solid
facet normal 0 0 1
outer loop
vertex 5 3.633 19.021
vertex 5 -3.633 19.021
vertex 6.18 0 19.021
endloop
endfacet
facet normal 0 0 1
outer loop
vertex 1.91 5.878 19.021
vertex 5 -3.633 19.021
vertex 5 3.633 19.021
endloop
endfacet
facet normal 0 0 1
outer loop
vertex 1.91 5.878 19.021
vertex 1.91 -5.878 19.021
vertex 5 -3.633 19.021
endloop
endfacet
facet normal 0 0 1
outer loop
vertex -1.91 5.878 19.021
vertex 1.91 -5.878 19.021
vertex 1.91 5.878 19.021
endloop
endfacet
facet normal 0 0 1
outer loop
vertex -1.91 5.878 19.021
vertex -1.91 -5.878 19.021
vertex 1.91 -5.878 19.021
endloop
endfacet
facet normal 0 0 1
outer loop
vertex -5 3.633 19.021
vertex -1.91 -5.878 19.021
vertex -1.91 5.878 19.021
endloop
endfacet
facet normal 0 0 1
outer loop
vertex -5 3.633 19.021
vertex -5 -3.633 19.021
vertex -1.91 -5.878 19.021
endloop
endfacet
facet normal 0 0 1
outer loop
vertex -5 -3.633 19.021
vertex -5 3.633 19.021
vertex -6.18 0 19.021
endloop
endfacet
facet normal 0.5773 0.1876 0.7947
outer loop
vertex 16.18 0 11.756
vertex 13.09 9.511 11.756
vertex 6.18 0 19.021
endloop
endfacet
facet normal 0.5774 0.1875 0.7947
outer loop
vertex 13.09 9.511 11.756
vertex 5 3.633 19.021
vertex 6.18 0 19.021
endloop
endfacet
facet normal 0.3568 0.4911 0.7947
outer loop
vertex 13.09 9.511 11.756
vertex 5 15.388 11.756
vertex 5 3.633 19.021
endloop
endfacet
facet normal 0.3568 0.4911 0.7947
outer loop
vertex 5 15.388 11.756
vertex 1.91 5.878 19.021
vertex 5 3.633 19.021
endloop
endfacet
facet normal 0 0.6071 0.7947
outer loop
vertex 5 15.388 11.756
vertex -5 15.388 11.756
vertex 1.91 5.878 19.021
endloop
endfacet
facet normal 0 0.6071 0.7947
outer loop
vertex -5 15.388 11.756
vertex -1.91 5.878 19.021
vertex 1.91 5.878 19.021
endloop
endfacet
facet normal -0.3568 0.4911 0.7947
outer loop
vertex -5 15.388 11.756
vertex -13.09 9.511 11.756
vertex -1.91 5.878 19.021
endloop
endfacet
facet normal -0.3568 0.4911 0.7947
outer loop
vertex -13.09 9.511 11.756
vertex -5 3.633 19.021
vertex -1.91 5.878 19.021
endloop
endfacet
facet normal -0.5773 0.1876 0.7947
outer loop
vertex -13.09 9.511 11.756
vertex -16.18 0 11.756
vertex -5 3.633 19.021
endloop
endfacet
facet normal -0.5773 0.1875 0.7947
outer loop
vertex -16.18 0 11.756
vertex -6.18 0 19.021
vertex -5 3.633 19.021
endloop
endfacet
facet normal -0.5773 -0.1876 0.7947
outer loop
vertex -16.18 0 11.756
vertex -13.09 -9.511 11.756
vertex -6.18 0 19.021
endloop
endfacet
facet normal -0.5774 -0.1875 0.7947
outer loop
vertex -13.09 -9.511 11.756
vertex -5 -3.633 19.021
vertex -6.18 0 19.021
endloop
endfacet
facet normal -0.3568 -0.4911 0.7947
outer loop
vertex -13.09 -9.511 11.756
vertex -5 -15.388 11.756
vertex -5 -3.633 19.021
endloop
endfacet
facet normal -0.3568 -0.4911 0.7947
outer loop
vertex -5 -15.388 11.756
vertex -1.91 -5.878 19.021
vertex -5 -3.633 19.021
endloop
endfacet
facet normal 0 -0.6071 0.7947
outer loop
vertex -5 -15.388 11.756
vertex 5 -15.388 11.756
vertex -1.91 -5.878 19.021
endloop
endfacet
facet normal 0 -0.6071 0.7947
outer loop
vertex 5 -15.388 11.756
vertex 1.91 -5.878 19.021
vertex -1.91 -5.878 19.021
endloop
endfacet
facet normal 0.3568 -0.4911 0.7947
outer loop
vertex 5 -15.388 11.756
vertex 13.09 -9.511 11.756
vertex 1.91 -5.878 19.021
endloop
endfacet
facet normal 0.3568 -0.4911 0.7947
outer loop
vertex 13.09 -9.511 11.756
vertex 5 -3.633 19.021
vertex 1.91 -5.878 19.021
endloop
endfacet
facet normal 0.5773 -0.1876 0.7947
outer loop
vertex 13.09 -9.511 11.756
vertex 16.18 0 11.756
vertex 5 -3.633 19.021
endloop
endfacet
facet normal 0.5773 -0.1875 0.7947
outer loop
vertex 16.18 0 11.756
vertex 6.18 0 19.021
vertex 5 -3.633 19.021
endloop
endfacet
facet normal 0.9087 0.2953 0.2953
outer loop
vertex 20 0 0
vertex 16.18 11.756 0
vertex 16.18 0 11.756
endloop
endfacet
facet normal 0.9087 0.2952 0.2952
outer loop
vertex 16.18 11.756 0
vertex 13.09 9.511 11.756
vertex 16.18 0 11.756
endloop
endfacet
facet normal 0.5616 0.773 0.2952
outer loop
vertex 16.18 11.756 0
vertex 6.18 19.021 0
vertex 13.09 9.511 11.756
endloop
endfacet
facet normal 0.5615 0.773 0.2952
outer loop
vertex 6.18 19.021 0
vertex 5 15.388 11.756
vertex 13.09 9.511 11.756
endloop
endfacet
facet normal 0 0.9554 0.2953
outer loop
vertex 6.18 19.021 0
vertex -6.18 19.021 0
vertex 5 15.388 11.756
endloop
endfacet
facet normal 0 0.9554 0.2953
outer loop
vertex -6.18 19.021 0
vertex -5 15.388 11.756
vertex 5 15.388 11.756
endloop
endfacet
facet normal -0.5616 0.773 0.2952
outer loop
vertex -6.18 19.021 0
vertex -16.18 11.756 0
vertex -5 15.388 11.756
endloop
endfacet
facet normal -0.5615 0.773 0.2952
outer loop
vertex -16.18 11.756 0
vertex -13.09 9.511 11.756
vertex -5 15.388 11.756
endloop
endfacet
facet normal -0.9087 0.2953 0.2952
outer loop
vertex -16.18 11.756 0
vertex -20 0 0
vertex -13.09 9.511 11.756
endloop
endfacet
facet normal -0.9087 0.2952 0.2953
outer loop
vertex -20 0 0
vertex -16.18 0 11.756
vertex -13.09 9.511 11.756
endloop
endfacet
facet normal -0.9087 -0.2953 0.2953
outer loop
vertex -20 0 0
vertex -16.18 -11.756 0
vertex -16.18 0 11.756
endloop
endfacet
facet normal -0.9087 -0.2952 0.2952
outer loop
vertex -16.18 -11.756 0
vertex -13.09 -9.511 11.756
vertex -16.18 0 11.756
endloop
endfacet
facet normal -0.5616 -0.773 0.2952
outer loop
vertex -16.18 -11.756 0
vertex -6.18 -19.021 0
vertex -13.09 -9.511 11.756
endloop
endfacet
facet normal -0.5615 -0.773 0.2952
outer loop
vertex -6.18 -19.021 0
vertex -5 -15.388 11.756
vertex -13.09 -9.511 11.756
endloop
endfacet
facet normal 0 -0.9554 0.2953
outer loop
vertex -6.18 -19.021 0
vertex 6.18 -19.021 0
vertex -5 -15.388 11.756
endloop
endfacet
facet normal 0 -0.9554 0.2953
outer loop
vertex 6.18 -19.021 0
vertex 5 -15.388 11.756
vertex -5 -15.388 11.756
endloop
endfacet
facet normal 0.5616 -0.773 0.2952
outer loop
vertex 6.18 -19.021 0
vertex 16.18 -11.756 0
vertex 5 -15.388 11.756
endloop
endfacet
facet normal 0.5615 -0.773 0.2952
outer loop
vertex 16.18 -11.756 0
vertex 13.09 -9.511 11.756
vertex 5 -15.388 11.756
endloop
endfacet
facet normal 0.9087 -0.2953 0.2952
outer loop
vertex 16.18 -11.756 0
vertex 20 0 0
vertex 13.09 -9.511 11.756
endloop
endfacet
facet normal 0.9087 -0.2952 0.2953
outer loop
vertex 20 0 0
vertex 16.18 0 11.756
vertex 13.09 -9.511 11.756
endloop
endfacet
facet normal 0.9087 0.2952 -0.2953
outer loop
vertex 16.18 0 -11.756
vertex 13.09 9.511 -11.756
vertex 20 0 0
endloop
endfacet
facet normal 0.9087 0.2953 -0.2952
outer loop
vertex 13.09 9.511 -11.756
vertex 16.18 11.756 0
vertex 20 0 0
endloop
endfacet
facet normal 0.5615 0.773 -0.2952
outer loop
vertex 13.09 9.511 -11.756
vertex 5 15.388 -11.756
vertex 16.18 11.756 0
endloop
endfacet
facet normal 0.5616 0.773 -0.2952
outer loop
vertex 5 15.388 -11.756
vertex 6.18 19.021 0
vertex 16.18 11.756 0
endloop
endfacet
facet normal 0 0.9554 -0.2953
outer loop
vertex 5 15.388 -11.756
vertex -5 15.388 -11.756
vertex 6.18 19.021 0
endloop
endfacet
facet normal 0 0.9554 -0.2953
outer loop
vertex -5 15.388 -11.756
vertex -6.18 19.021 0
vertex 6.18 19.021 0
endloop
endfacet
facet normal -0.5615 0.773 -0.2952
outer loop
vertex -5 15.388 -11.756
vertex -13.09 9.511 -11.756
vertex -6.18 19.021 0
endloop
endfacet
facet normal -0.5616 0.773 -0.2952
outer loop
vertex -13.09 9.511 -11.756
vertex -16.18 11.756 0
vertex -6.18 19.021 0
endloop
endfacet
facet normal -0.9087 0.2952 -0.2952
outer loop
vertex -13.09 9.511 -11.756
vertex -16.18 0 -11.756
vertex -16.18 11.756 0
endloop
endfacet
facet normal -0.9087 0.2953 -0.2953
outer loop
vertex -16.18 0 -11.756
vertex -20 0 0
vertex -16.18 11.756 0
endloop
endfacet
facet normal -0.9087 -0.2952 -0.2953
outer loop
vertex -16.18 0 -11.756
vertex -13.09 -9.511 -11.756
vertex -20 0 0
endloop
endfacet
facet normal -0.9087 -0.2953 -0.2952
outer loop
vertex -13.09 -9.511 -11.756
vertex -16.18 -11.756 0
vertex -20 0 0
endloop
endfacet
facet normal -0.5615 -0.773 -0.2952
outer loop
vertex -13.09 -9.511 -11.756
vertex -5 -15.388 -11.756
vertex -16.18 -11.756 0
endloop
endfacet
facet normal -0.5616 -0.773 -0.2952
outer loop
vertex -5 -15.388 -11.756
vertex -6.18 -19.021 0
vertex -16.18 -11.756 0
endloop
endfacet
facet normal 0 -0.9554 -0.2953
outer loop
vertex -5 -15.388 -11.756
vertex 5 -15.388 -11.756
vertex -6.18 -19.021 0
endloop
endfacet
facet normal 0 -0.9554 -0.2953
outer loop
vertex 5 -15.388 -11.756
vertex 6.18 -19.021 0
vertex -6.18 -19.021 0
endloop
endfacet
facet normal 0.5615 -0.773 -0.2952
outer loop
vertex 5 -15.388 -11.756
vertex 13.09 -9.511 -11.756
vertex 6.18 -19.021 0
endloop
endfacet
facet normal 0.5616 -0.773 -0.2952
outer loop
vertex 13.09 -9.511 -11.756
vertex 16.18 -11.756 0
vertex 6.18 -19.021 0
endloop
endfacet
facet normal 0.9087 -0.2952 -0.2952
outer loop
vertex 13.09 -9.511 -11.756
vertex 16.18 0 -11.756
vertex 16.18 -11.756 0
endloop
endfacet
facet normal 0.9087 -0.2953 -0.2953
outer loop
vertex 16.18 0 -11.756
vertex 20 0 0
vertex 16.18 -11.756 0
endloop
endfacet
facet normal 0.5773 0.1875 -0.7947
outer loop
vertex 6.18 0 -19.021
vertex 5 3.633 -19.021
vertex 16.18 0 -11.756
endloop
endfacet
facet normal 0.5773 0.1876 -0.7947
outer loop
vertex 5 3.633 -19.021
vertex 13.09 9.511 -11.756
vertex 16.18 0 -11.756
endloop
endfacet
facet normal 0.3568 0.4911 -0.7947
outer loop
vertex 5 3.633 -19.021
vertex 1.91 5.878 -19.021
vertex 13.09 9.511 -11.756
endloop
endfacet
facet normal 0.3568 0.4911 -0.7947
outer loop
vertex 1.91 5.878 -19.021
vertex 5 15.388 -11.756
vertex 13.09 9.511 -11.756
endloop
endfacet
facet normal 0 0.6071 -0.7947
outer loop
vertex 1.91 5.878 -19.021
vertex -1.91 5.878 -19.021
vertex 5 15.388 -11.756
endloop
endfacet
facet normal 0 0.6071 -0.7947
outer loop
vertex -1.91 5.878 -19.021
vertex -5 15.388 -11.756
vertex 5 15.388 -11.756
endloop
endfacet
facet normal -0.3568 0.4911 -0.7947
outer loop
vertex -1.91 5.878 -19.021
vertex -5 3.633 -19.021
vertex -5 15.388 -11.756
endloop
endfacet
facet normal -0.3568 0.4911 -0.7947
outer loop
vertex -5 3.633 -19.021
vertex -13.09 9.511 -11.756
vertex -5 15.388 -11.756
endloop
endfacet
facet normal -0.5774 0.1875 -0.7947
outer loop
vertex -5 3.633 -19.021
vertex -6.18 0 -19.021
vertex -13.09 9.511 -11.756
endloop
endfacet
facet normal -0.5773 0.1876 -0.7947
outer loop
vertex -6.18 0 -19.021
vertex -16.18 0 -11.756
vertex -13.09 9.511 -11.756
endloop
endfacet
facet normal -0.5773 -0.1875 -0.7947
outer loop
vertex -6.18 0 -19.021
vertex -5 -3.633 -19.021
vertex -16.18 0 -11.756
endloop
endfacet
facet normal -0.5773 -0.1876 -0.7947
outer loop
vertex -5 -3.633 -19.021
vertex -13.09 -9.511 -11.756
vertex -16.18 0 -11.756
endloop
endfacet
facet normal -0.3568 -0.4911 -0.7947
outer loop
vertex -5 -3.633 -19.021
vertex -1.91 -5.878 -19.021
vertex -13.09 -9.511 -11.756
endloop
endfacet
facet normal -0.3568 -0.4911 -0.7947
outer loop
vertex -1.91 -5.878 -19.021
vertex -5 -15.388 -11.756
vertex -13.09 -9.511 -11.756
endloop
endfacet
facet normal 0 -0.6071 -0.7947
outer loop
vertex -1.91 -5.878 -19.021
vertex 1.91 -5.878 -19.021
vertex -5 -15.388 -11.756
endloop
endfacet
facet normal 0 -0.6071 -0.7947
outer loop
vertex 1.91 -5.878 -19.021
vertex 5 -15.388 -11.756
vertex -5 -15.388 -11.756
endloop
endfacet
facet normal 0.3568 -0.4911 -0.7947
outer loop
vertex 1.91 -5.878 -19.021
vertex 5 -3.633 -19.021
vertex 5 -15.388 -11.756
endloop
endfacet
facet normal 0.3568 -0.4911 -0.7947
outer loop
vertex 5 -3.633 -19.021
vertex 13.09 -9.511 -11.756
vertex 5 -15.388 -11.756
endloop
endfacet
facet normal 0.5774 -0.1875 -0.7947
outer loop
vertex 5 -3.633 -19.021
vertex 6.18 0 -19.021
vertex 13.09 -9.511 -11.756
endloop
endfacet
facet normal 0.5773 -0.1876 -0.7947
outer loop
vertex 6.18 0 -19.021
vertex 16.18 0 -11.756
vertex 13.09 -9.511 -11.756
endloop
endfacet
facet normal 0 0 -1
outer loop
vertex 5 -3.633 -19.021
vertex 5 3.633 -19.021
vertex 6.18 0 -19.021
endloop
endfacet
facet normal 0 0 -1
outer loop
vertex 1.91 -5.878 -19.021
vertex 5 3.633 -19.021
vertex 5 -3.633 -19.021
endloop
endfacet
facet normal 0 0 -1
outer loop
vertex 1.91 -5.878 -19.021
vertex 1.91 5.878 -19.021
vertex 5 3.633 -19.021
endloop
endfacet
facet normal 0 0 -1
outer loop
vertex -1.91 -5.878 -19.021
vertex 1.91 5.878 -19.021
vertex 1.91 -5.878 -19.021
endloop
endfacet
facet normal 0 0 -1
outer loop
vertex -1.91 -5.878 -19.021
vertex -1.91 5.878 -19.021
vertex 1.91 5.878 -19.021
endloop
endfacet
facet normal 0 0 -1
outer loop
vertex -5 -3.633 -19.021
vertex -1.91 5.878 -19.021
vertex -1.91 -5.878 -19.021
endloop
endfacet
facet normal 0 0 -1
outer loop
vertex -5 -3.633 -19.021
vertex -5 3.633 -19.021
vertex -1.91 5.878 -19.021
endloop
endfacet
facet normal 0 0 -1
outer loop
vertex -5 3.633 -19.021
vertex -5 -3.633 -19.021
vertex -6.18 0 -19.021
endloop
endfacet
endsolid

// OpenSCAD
sphere_radius=20; // [1:100]
sphere_resolution=10;// [1:100]

sphere(r=sphere_radius,$fn=sphere_resolution, center=true);
